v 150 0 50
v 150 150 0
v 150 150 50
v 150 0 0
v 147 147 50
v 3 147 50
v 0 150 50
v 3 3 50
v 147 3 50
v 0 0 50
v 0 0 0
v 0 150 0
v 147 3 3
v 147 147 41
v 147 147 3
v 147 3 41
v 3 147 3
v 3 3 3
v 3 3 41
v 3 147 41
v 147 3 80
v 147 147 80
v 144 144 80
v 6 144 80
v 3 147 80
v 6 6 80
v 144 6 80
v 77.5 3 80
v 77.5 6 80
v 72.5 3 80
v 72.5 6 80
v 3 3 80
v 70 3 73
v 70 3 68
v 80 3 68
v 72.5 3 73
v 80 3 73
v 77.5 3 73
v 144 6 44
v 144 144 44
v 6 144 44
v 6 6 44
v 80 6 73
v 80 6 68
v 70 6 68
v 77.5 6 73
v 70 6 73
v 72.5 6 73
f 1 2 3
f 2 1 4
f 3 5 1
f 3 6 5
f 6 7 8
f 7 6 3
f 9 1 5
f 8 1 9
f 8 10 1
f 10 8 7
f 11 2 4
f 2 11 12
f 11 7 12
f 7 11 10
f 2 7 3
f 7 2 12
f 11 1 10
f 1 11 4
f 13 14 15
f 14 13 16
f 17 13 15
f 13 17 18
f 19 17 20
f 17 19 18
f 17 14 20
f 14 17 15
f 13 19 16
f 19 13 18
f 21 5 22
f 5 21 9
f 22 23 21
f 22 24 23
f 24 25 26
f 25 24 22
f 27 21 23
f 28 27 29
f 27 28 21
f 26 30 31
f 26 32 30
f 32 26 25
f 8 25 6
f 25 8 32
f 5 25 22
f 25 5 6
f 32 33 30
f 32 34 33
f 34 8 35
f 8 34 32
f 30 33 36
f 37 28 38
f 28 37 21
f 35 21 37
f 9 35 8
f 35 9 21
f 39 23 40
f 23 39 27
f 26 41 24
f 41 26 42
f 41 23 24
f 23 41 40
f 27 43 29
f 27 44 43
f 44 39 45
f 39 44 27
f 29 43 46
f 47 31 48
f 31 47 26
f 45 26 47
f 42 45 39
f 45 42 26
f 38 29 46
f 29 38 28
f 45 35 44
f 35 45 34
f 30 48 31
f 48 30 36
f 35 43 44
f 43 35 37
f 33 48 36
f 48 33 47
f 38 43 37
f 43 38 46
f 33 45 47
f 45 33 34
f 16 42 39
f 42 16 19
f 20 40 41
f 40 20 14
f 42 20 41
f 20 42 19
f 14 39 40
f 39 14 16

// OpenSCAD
bottomWidth = 150;
bottomDepth = bottomWidth;
bottomHeight = 50;
bottomThick = 3;

lidSideThick = 2; // From lid
lidSideBoxClearance = 1; // clearance from lid to box on each side

topWidth = bottomWidth - 2 * (lidSideThick + lidSideBoxClearance);
topDepth = bottomDepth - 2 * (lidSideThick + lidSideBoxClearance);
topHeight = 30;
topThick = 3;

connectingBrimThick = max(topThick, bottomThick) * 2;

keywayWidth = 5;
keywayOffsetX = topWidth / 2;
keywayOffsetZ = 18;

keyholeWidth = 10;
keyholeHeight = 5;

union() {
    // Bottom shell
    difference() {
        // Box
        cube([bottomWidth, bottomDepth, bottomHeight]);
        // Cavity
        translate([bottomThick, bottomThick, bottomThick])
            cube([bottomWidth - bottomThick * 2, bottomDepth - bottomThick * 2, bottomHeight - bottomThick + 10]);
    };
    // Top shell
    translate([(bottomWidth - topWidth) / 2, (bottomDepth - topDepth) / 2, bottomHeight])
        difference() {
            // Box
            cube([topWidth, topDepth, topHeight]);
            // Cavity
            translate([topThick, topThick, 0])
                cube([topWidth - topThick * 2, topDepth - topThick * 2, topHeight + 10]);
            // Keyway slot
            translate([keywayOffsetX - keywayWidth / 2, 0, keywayOffsetZ])
                cube([keywayWidth, topThick, topHeight]);
            // Keyhole at bottom of slot
            translate([keywayOffsetX - keyholeWidth / 2, 0, keywayOffsetZ])
                cube([keyholeWidth, topThick, keyholeHeight]);
        };
    // Brim between top and bottom
    translate([0, 0, bottomHeight - connectingBrimThick])
        difference() {
            cube([bottomWidth, bottomDepth, connectingBrimThick]);
            translate([(bottomWidth - topWidth) / 2 + topThick, (bottomDepth - topDepth) / 2 + topThick, -5])
                cube([topWidth - topThick * 2, topDepth - topThick * 2, connectingBrimThick + 10]);
        };
    // Chamfer on brim
    chamferLegLenY = (bottomWidth - topWidth) / 2 + topThick - bottomThick;
    chamferLegLenX = (bottomDepth - topDepth) / 2 + topThick - bottomThick;
    translate([0, bottomThick, bottomHeight - connectingBrimThick])
        mirror([0, 1, 0])
            rotate([-90, 0, -90])
                linear_extrude(height=bottomWidth)
                    polygon([[0, 0], [chamferLegLenX, 0], [0, chamferLegLenX]]);
    translate([0, bottomDepth - bottomThick, bottomHeight - connectingBrimThick])
        mirror([0, 0, 0])
            rotate([-90, 0, -90])
                linear_extrude(height=bottomWidth)
                    polygon([[0, 0], [chamferLegLenX, 0], [0, chamferLegLenX]]);
    translate([bottomThick, 0, bottomHeight - connectingBrimThick])
        mirror([0, 0, 0])
            rotate([-90, 0, 0])
                linear_extrude(height=bottomDepth)
                    polygon([[0, 0], [chamferLegLenY, 0], [0, chamferLegLenY]]);
    translate([bottomWidth - bottomThick, 0, bottomHeight - connectingBrimThick])
        mirror([1, 0, 0])
            rotate([-90, 0, 0])
                linear_extrude(height=bottomDepth)
                    polygon([[0, 0], [chamferLegLenY, 0], [0, chamferLegLenY]]);
};
